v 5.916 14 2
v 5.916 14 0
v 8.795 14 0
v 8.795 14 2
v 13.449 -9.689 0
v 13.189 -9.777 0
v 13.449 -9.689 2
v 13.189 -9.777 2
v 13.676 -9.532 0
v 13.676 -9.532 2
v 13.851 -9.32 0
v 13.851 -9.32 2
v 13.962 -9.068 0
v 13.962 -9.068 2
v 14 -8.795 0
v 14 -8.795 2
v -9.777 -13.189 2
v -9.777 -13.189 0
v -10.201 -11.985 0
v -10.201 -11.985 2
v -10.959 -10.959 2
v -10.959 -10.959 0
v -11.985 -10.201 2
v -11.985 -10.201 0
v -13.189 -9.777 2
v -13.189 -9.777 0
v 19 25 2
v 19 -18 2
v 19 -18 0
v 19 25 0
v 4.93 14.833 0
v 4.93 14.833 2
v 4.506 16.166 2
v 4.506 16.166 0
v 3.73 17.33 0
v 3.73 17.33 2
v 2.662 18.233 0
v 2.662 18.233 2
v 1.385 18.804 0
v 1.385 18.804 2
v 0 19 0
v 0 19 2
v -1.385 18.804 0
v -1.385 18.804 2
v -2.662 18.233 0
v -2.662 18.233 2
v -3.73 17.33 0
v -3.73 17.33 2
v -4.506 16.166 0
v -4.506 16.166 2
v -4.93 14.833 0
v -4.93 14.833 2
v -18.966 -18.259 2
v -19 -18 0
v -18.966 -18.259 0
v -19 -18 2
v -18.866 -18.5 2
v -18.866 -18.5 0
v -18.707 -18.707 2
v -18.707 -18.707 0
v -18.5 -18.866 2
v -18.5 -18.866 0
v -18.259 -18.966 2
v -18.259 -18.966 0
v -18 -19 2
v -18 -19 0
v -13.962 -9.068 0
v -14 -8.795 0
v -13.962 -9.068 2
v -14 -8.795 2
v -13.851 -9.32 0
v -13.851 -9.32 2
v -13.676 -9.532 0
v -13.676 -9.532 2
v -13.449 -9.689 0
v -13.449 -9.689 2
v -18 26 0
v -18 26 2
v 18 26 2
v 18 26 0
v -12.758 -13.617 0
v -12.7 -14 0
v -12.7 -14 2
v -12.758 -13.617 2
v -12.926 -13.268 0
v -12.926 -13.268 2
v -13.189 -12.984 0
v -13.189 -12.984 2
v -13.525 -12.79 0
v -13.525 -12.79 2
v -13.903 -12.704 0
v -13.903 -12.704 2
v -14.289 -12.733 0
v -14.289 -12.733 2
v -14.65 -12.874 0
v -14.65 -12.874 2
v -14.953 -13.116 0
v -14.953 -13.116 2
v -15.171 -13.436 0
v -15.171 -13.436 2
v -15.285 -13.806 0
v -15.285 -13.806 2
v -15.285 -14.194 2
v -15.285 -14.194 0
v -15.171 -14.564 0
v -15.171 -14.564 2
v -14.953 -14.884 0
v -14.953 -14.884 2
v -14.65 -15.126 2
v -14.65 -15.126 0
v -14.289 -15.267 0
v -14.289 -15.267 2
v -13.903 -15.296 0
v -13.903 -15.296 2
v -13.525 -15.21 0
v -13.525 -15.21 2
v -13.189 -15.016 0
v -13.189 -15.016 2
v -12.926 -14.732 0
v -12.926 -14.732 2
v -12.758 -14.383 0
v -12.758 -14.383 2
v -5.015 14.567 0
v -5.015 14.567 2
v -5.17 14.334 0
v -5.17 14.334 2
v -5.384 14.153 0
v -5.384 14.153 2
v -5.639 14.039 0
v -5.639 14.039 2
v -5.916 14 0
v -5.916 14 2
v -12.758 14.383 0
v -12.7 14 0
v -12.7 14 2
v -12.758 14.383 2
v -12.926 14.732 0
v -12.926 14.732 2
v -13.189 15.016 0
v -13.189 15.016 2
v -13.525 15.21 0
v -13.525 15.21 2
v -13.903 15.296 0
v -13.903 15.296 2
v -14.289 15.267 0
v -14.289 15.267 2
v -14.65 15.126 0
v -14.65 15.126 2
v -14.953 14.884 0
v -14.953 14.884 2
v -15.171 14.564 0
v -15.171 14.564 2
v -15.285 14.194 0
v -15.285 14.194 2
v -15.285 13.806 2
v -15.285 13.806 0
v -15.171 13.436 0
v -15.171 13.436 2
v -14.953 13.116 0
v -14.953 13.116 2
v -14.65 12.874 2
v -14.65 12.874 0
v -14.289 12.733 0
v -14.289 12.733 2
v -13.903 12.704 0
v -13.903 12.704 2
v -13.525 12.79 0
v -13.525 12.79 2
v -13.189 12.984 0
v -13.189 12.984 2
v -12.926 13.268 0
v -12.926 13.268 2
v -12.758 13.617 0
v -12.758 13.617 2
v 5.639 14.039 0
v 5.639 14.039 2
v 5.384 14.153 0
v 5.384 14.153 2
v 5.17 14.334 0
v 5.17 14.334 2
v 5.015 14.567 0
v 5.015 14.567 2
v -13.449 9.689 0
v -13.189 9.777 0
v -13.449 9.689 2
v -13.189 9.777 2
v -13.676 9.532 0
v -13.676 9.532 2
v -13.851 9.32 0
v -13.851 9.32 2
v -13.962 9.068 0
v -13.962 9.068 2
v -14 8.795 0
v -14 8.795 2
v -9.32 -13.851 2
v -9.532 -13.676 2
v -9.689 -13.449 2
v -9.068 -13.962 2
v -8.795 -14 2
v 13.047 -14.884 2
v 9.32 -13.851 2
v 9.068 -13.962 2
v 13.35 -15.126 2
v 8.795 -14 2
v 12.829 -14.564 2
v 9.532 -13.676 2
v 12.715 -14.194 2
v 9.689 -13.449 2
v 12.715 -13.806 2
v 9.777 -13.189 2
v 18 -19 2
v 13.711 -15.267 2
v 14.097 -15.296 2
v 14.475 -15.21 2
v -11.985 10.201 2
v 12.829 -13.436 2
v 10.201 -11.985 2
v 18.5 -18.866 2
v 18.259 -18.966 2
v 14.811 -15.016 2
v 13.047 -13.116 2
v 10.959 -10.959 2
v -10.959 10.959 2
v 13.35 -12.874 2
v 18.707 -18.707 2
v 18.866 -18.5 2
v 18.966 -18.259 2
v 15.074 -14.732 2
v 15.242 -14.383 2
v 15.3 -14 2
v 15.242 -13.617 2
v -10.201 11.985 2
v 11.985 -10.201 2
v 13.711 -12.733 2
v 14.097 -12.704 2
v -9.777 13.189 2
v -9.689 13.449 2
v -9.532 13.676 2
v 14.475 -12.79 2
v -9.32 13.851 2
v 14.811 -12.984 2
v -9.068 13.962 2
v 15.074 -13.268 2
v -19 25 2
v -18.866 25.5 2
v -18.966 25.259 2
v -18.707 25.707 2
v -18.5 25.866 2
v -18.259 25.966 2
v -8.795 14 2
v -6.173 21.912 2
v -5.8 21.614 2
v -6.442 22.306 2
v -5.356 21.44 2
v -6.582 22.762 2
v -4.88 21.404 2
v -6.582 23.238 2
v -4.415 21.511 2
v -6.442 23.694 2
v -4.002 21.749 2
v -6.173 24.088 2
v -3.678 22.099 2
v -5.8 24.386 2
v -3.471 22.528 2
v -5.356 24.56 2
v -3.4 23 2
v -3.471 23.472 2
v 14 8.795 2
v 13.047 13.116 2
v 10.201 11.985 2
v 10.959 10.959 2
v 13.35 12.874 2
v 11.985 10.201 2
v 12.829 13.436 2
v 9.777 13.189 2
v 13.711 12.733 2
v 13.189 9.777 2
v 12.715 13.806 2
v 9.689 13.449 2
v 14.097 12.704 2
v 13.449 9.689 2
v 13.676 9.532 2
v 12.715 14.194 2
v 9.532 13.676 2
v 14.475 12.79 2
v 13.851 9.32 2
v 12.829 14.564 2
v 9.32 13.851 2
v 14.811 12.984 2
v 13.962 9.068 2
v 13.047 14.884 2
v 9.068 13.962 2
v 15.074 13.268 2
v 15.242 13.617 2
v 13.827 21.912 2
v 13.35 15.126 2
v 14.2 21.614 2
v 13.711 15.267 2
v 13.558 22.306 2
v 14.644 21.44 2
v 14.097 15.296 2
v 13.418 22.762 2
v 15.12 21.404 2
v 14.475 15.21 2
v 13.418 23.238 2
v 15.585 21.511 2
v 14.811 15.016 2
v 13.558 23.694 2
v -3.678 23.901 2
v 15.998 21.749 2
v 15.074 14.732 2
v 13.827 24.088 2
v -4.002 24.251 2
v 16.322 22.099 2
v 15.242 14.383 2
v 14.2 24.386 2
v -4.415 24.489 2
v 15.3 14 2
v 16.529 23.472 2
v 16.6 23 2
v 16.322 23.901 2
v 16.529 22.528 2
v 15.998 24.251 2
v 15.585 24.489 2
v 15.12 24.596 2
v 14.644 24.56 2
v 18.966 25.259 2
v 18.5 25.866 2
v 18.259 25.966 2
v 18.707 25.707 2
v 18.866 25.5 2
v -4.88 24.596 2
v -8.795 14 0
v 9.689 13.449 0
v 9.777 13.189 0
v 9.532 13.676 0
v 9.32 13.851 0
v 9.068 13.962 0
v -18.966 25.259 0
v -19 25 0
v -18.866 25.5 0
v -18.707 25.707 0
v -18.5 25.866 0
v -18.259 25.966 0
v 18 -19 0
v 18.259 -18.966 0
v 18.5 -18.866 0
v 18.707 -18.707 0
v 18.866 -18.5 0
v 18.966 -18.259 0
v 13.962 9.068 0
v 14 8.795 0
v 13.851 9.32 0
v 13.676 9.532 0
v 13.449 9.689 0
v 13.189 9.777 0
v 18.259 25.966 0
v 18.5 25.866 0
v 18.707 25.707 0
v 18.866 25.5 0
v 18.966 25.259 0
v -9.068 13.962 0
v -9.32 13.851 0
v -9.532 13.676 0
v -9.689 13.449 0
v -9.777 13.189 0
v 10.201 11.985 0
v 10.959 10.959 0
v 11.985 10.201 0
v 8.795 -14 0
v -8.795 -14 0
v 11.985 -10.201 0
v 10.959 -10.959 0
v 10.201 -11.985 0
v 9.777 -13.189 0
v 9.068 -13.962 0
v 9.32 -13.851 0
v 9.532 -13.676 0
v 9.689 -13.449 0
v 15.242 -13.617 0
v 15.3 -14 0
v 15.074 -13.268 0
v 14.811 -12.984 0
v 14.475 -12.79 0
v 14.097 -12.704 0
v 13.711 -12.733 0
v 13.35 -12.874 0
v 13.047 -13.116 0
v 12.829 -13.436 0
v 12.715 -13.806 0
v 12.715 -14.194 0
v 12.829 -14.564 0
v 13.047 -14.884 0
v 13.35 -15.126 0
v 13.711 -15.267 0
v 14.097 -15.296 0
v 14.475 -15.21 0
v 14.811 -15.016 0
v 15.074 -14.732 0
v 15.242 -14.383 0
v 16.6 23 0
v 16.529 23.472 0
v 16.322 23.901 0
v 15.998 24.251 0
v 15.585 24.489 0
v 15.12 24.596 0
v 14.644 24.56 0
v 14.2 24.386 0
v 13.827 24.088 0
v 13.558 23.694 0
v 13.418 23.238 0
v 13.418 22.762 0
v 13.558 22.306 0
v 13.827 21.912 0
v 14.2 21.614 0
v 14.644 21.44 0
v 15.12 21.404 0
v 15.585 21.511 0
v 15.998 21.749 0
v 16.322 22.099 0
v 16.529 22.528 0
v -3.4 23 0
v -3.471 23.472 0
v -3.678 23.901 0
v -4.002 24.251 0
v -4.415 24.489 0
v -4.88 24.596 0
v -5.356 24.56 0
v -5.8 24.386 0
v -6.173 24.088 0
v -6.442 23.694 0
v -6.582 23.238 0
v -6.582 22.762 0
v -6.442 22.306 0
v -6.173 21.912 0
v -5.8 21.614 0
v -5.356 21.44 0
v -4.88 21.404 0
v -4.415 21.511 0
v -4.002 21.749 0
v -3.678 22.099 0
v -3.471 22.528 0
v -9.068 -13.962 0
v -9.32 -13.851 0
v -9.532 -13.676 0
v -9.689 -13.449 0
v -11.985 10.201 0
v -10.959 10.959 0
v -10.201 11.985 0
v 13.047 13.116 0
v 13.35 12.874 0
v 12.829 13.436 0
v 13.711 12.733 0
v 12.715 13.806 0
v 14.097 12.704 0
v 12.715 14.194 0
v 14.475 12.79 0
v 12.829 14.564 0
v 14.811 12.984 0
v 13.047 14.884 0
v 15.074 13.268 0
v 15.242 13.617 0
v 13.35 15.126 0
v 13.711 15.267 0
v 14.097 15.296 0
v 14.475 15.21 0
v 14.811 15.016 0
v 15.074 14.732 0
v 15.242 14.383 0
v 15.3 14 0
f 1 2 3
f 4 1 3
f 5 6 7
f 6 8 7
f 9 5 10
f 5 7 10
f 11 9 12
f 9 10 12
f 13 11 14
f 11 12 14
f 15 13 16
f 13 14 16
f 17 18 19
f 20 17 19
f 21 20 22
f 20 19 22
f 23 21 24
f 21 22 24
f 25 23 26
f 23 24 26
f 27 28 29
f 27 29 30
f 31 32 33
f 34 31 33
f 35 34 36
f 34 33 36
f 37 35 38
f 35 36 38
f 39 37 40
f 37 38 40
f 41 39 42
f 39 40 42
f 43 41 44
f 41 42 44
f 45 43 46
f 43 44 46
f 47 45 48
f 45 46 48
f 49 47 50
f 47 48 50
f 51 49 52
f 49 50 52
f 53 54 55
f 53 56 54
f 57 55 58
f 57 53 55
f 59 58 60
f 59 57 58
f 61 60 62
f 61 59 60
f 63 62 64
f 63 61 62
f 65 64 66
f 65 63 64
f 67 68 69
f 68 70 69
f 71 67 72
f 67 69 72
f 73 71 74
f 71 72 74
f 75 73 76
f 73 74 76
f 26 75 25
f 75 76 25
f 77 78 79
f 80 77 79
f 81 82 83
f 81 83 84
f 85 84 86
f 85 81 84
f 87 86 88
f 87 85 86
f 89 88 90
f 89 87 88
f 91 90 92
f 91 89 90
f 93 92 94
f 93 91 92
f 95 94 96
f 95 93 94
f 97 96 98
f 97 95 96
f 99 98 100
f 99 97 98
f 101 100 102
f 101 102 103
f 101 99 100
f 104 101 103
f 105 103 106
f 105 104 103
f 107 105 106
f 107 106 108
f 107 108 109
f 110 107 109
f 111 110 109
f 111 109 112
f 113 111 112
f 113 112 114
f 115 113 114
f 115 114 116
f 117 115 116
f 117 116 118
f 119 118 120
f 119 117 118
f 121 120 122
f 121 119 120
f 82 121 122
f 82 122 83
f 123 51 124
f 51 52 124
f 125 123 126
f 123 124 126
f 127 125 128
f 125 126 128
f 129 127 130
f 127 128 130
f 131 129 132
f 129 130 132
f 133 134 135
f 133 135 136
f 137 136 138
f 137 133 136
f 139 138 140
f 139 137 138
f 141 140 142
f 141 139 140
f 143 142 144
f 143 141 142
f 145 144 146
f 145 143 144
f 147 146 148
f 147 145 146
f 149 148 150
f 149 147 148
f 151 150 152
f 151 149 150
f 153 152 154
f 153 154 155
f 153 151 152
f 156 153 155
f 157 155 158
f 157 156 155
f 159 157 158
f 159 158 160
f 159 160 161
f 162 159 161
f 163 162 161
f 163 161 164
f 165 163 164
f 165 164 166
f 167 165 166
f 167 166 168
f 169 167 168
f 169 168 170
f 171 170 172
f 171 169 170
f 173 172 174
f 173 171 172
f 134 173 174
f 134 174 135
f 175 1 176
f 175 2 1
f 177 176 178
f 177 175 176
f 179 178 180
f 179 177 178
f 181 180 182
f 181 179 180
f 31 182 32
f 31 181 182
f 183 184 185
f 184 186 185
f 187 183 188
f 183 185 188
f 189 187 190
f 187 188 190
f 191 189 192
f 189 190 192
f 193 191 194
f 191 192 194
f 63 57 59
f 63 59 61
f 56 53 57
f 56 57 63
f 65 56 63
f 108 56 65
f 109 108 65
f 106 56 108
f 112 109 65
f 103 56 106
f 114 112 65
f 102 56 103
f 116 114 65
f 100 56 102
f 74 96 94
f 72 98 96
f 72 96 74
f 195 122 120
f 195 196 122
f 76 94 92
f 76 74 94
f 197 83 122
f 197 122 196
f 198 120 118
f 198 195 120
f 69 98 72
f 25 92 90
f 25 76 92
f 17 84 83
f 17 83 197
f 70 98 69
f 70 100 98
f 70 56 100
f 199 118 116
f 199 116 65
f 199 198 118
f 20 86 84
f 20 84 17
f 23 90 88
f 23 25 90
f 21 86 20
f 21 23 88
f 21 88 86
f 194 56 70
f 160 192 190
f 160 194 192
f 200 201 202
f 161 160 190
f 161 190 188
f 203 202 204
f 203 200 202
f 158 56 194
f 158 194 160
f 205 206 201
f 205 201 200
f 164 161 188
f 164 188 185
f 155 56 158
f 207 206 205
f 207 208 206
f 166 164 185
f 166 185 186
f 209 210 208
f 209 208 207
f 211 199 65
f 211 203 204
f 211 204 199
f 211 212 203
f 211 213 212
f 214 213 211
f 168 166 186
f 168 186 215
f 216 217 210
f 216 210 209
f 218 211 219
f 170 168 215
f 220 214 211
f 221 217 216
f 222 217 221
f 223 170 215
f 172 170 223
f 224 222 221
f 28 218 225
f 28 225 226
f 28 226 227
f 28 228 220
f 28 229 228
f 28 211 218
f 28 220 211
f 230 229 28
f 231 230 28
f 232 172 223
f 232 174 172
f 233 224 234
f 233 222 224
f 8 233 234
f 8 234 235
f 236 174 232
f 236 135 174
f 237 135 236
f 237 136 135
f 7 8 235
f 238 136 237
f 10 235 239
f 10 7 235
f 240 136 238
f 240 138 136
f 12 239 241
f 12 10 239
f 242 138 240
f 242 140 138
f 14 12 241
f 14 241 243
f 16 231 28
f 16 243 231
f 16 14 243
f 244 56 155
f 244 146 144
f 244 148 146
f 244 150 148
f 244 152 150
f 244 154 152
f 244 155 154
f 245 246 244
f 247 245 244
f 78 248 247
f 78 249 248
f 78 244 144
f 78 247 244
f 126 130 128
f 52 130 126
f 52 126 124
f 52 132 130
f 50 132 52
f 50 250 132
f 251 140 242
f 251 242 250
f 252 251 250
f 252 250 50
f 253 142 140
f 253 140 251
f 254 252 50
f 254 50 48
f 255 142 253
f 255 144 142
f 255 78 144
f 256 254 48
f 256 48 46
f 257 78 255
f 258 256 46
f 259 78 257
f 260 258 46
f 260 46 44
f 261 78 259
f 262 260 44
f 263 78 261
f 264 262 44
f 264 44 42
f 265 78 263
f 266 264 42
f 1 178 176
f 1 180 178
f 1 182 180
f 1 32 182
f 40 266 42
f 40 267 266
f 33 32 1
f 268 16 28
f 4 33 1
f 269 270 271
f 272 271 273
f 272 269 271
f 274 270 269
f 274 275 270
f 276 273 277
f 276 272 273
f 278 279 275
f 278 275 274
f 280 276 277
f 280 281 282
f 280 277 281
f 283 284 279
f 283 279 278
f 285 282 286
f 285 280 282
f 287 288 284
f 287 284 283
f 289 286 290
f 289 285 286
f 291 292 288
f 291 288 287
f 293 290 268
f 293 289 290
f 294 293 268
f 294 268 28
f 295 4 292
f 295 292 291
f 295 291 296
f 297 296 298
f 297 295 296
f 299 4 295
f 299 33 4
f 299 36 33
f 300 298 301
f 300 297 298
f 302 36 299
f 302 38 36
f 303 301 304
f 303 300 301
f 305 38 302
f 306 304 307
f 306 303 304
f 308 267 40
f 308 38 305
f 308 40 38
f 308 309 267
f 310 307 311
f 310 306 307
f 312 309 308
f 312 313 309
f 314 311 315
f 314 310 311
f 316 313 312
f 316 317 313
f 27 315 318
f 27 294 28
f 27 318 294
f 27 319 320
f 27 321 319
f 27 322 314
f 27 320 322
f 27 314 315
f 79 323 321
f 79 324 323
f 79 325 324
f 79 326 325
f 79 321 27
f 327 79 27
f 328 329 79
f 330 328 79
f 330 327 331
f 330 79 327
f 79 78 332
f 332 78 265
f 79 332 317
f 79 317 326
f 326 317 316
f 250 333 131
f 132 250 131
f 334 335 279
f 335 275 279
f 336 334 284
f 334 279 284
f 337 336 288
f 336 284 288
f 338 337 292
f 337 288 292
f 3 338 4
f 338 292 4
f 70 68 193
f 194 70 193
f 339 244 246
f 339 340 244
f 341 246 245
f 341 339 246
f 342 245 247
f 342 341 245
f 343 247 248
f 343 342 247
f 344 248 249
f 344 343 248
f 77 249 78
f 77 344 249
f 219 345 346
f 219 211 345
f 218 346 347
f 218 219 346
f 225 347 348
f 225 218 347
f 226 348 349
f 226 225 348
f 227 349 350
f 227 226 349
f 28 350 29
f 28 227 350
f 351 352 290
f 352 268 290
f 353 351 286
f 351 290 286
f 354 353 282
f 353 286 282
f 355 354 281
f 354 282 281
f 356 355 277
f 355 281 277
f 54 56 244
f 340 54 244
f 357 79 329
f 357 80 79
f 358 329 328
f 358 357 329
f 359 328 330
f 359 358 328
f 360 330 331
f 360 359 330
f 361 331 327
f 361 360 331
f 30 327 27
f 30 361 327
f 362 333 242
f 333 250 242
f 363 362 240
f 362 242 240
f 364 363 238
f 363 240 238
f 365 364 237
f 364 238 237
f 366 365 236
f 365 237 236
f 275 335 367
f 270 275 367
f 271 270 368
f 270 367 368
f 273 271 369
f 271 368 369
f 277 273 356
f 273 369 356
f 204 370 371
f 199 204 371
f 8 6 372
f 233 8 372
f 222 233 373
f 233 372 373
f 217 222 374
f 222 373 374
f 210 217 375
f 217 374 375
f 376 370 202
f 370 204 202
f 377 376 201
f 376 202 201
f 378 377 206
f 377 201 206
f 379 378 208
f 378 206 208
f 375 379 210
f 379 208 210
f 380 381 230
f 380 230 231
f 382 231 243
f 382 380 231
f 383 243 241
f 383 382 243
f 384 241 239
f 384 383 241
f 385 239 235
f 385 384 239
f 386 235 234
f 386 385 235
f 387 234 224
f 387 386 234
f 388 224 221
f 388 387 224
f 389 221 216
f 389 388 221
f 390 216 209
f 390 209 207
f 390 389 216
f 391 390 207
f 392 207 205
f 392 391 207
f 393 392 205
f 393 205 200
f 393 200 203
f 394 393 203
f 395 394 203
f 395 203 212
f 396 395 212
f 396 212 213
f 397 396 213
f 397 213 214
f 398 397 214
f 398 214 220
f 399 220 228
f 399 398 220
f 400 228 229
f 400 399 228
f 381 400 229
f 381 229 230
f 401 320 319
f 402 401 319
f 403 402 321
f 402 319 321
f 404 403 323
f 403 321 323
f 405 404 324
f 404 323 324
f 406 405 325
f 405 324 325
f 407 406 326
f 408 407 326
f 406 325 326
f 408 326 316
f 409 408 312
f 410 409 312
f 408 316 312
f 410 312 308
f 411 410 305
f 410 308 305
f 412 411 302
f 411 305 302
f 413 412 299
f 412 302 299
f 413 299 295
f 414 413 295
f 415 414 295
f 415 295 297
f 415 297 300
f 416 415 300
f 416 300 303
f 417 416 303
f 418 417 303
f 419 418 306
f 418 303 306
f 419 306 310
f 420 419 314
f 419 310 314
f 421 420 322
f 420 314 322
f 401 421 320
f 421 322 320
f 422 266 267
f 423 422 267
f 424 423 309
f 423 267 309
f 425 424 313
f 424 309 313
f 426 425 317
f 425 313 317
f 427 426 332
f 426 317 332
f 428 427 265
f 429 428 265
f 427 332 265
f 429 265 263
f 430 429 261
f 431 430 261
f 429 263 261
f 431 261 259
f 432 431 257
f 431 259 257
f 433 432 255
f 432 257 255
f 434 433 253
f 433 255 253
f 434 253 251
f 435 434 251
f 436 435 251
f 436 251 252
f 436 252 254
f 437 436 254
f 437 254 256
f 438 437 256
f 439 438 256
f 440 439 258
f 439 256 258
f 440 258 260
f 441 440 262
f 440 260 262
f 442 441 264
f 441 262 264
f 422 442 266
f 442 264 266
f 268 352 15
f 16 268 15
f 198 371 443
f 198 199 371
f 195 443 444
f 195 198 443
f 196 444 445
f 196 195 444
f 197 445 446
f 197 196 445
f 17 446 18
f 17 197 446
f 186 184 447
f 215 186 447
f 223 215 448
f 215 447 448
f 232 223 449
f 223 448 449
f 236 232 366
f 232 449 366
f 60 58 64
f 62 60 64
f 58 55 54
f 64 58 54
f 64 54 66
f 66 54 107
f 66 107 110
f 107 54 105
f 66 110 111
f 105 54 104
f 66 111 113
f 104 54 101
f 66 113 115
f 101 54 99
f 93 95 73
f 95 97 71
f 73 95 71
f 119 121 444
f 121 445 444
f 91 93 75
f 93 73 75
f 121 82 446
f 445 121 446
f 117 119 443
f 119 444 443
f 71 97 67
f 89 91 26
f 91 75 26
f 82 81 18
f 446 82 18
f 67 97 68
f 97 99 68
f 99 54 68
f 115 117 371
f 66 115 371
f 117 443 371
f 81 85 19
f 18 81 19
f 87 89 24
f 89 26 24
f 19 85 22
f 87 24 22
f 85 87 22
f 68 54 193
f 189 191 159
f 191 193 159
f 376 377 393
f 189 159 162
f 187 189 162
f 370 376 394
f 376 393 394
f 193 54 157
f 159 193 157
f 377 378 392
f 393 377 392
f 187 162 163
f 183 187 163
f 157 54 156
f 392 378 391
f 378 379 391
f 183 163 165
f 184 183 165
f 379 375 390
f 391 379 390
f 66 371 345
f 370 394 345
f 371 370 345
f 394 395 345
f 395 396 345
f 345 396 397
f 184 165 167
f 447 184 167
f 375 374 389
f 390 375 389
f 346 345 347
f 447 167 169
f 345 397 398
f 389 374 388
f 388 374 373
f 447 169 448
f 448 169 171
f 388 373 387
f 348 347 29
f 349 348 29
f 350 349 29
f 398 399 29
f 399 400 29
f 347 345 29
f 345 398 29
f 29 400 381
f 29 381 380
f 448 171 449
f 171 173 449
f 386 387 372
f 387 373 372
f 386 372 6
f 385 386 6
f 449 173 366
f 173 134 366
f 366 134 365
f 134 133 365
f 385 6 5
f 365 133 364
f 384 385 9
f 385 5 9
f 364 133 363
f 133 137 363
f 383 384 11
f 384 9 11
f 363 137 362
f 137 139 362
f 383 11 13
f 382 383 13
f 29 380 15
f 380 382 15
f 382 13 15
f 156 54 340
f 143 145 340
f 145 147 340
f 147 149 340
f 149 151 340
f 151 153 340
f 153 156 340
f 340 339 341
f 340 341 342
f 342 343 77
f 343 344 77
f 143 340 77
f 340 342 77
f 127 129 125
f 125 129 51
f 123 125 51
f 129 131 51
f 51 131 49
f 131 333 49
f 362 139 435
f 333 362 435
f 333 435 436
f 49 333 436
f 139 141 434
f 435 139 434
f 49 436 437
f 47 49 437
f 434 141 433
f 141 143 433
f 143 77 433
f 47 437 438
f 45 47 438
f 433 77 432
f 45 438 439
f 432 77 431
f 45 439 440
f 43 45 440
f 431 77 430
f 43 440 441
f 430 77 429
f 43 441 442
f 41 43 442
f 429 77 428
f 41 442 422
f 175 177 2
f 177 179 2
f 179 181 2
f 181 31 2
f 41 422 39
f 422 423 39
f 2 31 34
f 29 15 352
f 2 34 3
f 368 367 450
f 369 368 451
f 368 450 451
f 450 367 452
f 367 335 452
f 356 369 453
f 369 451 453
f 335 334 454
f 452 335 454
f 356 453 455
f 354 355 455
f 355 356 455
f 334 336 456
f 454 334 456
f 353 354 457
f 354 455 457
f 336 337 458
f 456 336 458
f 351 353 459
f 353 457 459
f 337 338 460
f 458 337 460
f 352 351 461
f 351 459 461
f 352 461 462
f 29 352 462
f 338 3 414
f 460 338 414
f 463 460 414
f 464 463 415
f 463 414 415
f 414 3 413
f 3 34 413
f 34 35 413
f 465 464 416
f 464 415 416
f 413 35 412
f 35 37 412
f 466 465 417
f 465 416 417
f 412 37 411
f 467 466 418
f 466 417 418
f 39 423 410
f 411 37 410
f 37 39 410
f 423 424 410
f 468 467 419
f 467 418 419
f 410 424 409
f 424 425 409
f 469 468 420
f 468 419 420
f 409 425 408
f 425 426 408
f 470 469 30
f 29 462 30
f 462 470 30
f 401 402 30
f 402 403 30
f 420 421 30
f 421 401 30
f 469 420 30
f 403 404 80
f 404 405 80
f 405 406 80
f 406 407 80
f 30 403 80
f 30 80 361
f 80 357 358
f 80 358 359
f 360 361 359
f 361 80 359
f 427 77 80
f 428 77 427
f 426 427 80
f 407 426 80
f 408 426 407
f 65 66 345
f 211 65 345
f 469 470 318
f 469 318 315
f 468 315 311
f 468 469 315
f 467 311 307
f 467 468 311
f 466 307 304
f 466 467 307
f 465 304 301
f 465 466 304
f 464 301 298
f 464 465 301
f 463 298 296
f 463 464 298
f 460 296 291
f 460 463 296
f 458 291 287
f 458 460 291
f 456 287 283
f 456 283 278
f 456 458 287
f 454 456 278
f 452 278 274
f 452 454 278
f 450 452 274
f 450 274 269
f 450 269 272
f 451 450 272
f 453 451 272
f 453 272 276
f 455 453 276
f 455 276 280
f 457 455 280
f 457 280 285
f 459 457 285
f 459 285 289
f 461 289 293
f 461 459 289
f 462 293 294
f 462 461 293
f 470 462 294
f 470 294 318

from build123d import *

# Parameters (mm, degrees)
SKETCH_1_W          = 38
SKETCH_1_H          = 38
SKETCH_1_R          = 1.3
EXTRUDE_1_DEPTH     = 2
SKETCH_2_W          = 38
SKETCH_2_H          = 7
SKETCH_2_R          = 1.6
EXTRUDE_2_DEPTH     = 2
SKETCH_3_R          = 5
CUT_EXTRUDE_1_DEPTH = 33.26453161
FILLET_1_R          = 1


with BuildPart() as part:
    # 草图1 → 凸台-拉伸1 (new body)
    with BuildSketch(Plane.XY):
        Rectangle(SKETCH_1_W, SKETCH_1_H)
        with BuildLine():
            Line((-14, -9.7), (-14, 9.7))
            ThreePointArc((-14, 9.7), (-10.959440841, 10.959440841), (-9.7, 14))
            Line((-9.7, 14), (9.7, 14))
            ThreePointArc((9.7, 14), (10.959440841, 10.959440841), (14, 9.7))
            Line((14, 9.7), (14, -9.7))
            ThreePointArc((14, -9.7), (10.959440841, -10.959440841), (9.7, -14))
            Line((9.7, -14), (-9.7, -14))
            ThreePointArc((-9.7, -14), (-10.959440841, -10.959440841), (-14, -9.7))
        make_face(mode=Mode.SUBTRACT)
        with Locations((14, -14)):
            Circle(SKETCH_1_R, mode=Mode.SUBTRACT)
        with Locations((14, 14)):
            Circle(SKETCH_1_R, mode=Mode.SUBTRACT)
        with Locations((-14, 14)):
            Circle(SKETCH_1_R, mode=Mode.SUBTRACT)
        with Locations((-14, -14)):
            Circle(SKETCH_1_R, mode=Mode.SUBTRACT)
    extrude(amount=EXTRUDE_1_DEPTH)

    # 草图2 → 凸台-拉伸2 (add)
    with BuildSketch(Plane.XY.offset(2)):
        with Locations((0, 22.5)):
            Rectangle(SKETCH_2_W, SKETCH_2_H)
        with Locations((-5, 23)):
            Circle(SKETCH_2_R, mode=Mode.SUBTRACT)
        with Locations((15, 23)):
            Circle(SKETCH_2_R, mode=Mode.SUBTRACT)
    extrude(amount=-EXTRUDE_2_DEPTH)

    # 草图3 → 切除-拉伸1 (cut, through all)
    with BuildSketch(Plane.XY.offset(2)):
        with Locations((0, 14)):
            Circle(SKETCH_3_R)
    extrude(amount=-CUT_EXTRUDE_1_DEPTH, mode=Mode.SUBTRACT)

    # 圆角1
    fillet_1_edges = [part.edges().sort_by_distance(p)[0] for p in [
        (19, -19, 1),
        (-19, -19, 1),
        (-14, 9.7, 1),
        (-14, -9.7, 1),
        (-9.7, -14, 1),
        (9.7, -14, 1),
        (14, -9.7, 1),
        (14, 9.7, 1),
        (9.7, 14, 1),
        (-9.7, 14, 1),
        (19, 26, 1),
        (-19, 26, 1),
        (-5, 14, 1),
        (5, 14, 1),
    ]]
    fillet(fillet_1_edges, radius=FILLET_1_R)


solid = part.part
